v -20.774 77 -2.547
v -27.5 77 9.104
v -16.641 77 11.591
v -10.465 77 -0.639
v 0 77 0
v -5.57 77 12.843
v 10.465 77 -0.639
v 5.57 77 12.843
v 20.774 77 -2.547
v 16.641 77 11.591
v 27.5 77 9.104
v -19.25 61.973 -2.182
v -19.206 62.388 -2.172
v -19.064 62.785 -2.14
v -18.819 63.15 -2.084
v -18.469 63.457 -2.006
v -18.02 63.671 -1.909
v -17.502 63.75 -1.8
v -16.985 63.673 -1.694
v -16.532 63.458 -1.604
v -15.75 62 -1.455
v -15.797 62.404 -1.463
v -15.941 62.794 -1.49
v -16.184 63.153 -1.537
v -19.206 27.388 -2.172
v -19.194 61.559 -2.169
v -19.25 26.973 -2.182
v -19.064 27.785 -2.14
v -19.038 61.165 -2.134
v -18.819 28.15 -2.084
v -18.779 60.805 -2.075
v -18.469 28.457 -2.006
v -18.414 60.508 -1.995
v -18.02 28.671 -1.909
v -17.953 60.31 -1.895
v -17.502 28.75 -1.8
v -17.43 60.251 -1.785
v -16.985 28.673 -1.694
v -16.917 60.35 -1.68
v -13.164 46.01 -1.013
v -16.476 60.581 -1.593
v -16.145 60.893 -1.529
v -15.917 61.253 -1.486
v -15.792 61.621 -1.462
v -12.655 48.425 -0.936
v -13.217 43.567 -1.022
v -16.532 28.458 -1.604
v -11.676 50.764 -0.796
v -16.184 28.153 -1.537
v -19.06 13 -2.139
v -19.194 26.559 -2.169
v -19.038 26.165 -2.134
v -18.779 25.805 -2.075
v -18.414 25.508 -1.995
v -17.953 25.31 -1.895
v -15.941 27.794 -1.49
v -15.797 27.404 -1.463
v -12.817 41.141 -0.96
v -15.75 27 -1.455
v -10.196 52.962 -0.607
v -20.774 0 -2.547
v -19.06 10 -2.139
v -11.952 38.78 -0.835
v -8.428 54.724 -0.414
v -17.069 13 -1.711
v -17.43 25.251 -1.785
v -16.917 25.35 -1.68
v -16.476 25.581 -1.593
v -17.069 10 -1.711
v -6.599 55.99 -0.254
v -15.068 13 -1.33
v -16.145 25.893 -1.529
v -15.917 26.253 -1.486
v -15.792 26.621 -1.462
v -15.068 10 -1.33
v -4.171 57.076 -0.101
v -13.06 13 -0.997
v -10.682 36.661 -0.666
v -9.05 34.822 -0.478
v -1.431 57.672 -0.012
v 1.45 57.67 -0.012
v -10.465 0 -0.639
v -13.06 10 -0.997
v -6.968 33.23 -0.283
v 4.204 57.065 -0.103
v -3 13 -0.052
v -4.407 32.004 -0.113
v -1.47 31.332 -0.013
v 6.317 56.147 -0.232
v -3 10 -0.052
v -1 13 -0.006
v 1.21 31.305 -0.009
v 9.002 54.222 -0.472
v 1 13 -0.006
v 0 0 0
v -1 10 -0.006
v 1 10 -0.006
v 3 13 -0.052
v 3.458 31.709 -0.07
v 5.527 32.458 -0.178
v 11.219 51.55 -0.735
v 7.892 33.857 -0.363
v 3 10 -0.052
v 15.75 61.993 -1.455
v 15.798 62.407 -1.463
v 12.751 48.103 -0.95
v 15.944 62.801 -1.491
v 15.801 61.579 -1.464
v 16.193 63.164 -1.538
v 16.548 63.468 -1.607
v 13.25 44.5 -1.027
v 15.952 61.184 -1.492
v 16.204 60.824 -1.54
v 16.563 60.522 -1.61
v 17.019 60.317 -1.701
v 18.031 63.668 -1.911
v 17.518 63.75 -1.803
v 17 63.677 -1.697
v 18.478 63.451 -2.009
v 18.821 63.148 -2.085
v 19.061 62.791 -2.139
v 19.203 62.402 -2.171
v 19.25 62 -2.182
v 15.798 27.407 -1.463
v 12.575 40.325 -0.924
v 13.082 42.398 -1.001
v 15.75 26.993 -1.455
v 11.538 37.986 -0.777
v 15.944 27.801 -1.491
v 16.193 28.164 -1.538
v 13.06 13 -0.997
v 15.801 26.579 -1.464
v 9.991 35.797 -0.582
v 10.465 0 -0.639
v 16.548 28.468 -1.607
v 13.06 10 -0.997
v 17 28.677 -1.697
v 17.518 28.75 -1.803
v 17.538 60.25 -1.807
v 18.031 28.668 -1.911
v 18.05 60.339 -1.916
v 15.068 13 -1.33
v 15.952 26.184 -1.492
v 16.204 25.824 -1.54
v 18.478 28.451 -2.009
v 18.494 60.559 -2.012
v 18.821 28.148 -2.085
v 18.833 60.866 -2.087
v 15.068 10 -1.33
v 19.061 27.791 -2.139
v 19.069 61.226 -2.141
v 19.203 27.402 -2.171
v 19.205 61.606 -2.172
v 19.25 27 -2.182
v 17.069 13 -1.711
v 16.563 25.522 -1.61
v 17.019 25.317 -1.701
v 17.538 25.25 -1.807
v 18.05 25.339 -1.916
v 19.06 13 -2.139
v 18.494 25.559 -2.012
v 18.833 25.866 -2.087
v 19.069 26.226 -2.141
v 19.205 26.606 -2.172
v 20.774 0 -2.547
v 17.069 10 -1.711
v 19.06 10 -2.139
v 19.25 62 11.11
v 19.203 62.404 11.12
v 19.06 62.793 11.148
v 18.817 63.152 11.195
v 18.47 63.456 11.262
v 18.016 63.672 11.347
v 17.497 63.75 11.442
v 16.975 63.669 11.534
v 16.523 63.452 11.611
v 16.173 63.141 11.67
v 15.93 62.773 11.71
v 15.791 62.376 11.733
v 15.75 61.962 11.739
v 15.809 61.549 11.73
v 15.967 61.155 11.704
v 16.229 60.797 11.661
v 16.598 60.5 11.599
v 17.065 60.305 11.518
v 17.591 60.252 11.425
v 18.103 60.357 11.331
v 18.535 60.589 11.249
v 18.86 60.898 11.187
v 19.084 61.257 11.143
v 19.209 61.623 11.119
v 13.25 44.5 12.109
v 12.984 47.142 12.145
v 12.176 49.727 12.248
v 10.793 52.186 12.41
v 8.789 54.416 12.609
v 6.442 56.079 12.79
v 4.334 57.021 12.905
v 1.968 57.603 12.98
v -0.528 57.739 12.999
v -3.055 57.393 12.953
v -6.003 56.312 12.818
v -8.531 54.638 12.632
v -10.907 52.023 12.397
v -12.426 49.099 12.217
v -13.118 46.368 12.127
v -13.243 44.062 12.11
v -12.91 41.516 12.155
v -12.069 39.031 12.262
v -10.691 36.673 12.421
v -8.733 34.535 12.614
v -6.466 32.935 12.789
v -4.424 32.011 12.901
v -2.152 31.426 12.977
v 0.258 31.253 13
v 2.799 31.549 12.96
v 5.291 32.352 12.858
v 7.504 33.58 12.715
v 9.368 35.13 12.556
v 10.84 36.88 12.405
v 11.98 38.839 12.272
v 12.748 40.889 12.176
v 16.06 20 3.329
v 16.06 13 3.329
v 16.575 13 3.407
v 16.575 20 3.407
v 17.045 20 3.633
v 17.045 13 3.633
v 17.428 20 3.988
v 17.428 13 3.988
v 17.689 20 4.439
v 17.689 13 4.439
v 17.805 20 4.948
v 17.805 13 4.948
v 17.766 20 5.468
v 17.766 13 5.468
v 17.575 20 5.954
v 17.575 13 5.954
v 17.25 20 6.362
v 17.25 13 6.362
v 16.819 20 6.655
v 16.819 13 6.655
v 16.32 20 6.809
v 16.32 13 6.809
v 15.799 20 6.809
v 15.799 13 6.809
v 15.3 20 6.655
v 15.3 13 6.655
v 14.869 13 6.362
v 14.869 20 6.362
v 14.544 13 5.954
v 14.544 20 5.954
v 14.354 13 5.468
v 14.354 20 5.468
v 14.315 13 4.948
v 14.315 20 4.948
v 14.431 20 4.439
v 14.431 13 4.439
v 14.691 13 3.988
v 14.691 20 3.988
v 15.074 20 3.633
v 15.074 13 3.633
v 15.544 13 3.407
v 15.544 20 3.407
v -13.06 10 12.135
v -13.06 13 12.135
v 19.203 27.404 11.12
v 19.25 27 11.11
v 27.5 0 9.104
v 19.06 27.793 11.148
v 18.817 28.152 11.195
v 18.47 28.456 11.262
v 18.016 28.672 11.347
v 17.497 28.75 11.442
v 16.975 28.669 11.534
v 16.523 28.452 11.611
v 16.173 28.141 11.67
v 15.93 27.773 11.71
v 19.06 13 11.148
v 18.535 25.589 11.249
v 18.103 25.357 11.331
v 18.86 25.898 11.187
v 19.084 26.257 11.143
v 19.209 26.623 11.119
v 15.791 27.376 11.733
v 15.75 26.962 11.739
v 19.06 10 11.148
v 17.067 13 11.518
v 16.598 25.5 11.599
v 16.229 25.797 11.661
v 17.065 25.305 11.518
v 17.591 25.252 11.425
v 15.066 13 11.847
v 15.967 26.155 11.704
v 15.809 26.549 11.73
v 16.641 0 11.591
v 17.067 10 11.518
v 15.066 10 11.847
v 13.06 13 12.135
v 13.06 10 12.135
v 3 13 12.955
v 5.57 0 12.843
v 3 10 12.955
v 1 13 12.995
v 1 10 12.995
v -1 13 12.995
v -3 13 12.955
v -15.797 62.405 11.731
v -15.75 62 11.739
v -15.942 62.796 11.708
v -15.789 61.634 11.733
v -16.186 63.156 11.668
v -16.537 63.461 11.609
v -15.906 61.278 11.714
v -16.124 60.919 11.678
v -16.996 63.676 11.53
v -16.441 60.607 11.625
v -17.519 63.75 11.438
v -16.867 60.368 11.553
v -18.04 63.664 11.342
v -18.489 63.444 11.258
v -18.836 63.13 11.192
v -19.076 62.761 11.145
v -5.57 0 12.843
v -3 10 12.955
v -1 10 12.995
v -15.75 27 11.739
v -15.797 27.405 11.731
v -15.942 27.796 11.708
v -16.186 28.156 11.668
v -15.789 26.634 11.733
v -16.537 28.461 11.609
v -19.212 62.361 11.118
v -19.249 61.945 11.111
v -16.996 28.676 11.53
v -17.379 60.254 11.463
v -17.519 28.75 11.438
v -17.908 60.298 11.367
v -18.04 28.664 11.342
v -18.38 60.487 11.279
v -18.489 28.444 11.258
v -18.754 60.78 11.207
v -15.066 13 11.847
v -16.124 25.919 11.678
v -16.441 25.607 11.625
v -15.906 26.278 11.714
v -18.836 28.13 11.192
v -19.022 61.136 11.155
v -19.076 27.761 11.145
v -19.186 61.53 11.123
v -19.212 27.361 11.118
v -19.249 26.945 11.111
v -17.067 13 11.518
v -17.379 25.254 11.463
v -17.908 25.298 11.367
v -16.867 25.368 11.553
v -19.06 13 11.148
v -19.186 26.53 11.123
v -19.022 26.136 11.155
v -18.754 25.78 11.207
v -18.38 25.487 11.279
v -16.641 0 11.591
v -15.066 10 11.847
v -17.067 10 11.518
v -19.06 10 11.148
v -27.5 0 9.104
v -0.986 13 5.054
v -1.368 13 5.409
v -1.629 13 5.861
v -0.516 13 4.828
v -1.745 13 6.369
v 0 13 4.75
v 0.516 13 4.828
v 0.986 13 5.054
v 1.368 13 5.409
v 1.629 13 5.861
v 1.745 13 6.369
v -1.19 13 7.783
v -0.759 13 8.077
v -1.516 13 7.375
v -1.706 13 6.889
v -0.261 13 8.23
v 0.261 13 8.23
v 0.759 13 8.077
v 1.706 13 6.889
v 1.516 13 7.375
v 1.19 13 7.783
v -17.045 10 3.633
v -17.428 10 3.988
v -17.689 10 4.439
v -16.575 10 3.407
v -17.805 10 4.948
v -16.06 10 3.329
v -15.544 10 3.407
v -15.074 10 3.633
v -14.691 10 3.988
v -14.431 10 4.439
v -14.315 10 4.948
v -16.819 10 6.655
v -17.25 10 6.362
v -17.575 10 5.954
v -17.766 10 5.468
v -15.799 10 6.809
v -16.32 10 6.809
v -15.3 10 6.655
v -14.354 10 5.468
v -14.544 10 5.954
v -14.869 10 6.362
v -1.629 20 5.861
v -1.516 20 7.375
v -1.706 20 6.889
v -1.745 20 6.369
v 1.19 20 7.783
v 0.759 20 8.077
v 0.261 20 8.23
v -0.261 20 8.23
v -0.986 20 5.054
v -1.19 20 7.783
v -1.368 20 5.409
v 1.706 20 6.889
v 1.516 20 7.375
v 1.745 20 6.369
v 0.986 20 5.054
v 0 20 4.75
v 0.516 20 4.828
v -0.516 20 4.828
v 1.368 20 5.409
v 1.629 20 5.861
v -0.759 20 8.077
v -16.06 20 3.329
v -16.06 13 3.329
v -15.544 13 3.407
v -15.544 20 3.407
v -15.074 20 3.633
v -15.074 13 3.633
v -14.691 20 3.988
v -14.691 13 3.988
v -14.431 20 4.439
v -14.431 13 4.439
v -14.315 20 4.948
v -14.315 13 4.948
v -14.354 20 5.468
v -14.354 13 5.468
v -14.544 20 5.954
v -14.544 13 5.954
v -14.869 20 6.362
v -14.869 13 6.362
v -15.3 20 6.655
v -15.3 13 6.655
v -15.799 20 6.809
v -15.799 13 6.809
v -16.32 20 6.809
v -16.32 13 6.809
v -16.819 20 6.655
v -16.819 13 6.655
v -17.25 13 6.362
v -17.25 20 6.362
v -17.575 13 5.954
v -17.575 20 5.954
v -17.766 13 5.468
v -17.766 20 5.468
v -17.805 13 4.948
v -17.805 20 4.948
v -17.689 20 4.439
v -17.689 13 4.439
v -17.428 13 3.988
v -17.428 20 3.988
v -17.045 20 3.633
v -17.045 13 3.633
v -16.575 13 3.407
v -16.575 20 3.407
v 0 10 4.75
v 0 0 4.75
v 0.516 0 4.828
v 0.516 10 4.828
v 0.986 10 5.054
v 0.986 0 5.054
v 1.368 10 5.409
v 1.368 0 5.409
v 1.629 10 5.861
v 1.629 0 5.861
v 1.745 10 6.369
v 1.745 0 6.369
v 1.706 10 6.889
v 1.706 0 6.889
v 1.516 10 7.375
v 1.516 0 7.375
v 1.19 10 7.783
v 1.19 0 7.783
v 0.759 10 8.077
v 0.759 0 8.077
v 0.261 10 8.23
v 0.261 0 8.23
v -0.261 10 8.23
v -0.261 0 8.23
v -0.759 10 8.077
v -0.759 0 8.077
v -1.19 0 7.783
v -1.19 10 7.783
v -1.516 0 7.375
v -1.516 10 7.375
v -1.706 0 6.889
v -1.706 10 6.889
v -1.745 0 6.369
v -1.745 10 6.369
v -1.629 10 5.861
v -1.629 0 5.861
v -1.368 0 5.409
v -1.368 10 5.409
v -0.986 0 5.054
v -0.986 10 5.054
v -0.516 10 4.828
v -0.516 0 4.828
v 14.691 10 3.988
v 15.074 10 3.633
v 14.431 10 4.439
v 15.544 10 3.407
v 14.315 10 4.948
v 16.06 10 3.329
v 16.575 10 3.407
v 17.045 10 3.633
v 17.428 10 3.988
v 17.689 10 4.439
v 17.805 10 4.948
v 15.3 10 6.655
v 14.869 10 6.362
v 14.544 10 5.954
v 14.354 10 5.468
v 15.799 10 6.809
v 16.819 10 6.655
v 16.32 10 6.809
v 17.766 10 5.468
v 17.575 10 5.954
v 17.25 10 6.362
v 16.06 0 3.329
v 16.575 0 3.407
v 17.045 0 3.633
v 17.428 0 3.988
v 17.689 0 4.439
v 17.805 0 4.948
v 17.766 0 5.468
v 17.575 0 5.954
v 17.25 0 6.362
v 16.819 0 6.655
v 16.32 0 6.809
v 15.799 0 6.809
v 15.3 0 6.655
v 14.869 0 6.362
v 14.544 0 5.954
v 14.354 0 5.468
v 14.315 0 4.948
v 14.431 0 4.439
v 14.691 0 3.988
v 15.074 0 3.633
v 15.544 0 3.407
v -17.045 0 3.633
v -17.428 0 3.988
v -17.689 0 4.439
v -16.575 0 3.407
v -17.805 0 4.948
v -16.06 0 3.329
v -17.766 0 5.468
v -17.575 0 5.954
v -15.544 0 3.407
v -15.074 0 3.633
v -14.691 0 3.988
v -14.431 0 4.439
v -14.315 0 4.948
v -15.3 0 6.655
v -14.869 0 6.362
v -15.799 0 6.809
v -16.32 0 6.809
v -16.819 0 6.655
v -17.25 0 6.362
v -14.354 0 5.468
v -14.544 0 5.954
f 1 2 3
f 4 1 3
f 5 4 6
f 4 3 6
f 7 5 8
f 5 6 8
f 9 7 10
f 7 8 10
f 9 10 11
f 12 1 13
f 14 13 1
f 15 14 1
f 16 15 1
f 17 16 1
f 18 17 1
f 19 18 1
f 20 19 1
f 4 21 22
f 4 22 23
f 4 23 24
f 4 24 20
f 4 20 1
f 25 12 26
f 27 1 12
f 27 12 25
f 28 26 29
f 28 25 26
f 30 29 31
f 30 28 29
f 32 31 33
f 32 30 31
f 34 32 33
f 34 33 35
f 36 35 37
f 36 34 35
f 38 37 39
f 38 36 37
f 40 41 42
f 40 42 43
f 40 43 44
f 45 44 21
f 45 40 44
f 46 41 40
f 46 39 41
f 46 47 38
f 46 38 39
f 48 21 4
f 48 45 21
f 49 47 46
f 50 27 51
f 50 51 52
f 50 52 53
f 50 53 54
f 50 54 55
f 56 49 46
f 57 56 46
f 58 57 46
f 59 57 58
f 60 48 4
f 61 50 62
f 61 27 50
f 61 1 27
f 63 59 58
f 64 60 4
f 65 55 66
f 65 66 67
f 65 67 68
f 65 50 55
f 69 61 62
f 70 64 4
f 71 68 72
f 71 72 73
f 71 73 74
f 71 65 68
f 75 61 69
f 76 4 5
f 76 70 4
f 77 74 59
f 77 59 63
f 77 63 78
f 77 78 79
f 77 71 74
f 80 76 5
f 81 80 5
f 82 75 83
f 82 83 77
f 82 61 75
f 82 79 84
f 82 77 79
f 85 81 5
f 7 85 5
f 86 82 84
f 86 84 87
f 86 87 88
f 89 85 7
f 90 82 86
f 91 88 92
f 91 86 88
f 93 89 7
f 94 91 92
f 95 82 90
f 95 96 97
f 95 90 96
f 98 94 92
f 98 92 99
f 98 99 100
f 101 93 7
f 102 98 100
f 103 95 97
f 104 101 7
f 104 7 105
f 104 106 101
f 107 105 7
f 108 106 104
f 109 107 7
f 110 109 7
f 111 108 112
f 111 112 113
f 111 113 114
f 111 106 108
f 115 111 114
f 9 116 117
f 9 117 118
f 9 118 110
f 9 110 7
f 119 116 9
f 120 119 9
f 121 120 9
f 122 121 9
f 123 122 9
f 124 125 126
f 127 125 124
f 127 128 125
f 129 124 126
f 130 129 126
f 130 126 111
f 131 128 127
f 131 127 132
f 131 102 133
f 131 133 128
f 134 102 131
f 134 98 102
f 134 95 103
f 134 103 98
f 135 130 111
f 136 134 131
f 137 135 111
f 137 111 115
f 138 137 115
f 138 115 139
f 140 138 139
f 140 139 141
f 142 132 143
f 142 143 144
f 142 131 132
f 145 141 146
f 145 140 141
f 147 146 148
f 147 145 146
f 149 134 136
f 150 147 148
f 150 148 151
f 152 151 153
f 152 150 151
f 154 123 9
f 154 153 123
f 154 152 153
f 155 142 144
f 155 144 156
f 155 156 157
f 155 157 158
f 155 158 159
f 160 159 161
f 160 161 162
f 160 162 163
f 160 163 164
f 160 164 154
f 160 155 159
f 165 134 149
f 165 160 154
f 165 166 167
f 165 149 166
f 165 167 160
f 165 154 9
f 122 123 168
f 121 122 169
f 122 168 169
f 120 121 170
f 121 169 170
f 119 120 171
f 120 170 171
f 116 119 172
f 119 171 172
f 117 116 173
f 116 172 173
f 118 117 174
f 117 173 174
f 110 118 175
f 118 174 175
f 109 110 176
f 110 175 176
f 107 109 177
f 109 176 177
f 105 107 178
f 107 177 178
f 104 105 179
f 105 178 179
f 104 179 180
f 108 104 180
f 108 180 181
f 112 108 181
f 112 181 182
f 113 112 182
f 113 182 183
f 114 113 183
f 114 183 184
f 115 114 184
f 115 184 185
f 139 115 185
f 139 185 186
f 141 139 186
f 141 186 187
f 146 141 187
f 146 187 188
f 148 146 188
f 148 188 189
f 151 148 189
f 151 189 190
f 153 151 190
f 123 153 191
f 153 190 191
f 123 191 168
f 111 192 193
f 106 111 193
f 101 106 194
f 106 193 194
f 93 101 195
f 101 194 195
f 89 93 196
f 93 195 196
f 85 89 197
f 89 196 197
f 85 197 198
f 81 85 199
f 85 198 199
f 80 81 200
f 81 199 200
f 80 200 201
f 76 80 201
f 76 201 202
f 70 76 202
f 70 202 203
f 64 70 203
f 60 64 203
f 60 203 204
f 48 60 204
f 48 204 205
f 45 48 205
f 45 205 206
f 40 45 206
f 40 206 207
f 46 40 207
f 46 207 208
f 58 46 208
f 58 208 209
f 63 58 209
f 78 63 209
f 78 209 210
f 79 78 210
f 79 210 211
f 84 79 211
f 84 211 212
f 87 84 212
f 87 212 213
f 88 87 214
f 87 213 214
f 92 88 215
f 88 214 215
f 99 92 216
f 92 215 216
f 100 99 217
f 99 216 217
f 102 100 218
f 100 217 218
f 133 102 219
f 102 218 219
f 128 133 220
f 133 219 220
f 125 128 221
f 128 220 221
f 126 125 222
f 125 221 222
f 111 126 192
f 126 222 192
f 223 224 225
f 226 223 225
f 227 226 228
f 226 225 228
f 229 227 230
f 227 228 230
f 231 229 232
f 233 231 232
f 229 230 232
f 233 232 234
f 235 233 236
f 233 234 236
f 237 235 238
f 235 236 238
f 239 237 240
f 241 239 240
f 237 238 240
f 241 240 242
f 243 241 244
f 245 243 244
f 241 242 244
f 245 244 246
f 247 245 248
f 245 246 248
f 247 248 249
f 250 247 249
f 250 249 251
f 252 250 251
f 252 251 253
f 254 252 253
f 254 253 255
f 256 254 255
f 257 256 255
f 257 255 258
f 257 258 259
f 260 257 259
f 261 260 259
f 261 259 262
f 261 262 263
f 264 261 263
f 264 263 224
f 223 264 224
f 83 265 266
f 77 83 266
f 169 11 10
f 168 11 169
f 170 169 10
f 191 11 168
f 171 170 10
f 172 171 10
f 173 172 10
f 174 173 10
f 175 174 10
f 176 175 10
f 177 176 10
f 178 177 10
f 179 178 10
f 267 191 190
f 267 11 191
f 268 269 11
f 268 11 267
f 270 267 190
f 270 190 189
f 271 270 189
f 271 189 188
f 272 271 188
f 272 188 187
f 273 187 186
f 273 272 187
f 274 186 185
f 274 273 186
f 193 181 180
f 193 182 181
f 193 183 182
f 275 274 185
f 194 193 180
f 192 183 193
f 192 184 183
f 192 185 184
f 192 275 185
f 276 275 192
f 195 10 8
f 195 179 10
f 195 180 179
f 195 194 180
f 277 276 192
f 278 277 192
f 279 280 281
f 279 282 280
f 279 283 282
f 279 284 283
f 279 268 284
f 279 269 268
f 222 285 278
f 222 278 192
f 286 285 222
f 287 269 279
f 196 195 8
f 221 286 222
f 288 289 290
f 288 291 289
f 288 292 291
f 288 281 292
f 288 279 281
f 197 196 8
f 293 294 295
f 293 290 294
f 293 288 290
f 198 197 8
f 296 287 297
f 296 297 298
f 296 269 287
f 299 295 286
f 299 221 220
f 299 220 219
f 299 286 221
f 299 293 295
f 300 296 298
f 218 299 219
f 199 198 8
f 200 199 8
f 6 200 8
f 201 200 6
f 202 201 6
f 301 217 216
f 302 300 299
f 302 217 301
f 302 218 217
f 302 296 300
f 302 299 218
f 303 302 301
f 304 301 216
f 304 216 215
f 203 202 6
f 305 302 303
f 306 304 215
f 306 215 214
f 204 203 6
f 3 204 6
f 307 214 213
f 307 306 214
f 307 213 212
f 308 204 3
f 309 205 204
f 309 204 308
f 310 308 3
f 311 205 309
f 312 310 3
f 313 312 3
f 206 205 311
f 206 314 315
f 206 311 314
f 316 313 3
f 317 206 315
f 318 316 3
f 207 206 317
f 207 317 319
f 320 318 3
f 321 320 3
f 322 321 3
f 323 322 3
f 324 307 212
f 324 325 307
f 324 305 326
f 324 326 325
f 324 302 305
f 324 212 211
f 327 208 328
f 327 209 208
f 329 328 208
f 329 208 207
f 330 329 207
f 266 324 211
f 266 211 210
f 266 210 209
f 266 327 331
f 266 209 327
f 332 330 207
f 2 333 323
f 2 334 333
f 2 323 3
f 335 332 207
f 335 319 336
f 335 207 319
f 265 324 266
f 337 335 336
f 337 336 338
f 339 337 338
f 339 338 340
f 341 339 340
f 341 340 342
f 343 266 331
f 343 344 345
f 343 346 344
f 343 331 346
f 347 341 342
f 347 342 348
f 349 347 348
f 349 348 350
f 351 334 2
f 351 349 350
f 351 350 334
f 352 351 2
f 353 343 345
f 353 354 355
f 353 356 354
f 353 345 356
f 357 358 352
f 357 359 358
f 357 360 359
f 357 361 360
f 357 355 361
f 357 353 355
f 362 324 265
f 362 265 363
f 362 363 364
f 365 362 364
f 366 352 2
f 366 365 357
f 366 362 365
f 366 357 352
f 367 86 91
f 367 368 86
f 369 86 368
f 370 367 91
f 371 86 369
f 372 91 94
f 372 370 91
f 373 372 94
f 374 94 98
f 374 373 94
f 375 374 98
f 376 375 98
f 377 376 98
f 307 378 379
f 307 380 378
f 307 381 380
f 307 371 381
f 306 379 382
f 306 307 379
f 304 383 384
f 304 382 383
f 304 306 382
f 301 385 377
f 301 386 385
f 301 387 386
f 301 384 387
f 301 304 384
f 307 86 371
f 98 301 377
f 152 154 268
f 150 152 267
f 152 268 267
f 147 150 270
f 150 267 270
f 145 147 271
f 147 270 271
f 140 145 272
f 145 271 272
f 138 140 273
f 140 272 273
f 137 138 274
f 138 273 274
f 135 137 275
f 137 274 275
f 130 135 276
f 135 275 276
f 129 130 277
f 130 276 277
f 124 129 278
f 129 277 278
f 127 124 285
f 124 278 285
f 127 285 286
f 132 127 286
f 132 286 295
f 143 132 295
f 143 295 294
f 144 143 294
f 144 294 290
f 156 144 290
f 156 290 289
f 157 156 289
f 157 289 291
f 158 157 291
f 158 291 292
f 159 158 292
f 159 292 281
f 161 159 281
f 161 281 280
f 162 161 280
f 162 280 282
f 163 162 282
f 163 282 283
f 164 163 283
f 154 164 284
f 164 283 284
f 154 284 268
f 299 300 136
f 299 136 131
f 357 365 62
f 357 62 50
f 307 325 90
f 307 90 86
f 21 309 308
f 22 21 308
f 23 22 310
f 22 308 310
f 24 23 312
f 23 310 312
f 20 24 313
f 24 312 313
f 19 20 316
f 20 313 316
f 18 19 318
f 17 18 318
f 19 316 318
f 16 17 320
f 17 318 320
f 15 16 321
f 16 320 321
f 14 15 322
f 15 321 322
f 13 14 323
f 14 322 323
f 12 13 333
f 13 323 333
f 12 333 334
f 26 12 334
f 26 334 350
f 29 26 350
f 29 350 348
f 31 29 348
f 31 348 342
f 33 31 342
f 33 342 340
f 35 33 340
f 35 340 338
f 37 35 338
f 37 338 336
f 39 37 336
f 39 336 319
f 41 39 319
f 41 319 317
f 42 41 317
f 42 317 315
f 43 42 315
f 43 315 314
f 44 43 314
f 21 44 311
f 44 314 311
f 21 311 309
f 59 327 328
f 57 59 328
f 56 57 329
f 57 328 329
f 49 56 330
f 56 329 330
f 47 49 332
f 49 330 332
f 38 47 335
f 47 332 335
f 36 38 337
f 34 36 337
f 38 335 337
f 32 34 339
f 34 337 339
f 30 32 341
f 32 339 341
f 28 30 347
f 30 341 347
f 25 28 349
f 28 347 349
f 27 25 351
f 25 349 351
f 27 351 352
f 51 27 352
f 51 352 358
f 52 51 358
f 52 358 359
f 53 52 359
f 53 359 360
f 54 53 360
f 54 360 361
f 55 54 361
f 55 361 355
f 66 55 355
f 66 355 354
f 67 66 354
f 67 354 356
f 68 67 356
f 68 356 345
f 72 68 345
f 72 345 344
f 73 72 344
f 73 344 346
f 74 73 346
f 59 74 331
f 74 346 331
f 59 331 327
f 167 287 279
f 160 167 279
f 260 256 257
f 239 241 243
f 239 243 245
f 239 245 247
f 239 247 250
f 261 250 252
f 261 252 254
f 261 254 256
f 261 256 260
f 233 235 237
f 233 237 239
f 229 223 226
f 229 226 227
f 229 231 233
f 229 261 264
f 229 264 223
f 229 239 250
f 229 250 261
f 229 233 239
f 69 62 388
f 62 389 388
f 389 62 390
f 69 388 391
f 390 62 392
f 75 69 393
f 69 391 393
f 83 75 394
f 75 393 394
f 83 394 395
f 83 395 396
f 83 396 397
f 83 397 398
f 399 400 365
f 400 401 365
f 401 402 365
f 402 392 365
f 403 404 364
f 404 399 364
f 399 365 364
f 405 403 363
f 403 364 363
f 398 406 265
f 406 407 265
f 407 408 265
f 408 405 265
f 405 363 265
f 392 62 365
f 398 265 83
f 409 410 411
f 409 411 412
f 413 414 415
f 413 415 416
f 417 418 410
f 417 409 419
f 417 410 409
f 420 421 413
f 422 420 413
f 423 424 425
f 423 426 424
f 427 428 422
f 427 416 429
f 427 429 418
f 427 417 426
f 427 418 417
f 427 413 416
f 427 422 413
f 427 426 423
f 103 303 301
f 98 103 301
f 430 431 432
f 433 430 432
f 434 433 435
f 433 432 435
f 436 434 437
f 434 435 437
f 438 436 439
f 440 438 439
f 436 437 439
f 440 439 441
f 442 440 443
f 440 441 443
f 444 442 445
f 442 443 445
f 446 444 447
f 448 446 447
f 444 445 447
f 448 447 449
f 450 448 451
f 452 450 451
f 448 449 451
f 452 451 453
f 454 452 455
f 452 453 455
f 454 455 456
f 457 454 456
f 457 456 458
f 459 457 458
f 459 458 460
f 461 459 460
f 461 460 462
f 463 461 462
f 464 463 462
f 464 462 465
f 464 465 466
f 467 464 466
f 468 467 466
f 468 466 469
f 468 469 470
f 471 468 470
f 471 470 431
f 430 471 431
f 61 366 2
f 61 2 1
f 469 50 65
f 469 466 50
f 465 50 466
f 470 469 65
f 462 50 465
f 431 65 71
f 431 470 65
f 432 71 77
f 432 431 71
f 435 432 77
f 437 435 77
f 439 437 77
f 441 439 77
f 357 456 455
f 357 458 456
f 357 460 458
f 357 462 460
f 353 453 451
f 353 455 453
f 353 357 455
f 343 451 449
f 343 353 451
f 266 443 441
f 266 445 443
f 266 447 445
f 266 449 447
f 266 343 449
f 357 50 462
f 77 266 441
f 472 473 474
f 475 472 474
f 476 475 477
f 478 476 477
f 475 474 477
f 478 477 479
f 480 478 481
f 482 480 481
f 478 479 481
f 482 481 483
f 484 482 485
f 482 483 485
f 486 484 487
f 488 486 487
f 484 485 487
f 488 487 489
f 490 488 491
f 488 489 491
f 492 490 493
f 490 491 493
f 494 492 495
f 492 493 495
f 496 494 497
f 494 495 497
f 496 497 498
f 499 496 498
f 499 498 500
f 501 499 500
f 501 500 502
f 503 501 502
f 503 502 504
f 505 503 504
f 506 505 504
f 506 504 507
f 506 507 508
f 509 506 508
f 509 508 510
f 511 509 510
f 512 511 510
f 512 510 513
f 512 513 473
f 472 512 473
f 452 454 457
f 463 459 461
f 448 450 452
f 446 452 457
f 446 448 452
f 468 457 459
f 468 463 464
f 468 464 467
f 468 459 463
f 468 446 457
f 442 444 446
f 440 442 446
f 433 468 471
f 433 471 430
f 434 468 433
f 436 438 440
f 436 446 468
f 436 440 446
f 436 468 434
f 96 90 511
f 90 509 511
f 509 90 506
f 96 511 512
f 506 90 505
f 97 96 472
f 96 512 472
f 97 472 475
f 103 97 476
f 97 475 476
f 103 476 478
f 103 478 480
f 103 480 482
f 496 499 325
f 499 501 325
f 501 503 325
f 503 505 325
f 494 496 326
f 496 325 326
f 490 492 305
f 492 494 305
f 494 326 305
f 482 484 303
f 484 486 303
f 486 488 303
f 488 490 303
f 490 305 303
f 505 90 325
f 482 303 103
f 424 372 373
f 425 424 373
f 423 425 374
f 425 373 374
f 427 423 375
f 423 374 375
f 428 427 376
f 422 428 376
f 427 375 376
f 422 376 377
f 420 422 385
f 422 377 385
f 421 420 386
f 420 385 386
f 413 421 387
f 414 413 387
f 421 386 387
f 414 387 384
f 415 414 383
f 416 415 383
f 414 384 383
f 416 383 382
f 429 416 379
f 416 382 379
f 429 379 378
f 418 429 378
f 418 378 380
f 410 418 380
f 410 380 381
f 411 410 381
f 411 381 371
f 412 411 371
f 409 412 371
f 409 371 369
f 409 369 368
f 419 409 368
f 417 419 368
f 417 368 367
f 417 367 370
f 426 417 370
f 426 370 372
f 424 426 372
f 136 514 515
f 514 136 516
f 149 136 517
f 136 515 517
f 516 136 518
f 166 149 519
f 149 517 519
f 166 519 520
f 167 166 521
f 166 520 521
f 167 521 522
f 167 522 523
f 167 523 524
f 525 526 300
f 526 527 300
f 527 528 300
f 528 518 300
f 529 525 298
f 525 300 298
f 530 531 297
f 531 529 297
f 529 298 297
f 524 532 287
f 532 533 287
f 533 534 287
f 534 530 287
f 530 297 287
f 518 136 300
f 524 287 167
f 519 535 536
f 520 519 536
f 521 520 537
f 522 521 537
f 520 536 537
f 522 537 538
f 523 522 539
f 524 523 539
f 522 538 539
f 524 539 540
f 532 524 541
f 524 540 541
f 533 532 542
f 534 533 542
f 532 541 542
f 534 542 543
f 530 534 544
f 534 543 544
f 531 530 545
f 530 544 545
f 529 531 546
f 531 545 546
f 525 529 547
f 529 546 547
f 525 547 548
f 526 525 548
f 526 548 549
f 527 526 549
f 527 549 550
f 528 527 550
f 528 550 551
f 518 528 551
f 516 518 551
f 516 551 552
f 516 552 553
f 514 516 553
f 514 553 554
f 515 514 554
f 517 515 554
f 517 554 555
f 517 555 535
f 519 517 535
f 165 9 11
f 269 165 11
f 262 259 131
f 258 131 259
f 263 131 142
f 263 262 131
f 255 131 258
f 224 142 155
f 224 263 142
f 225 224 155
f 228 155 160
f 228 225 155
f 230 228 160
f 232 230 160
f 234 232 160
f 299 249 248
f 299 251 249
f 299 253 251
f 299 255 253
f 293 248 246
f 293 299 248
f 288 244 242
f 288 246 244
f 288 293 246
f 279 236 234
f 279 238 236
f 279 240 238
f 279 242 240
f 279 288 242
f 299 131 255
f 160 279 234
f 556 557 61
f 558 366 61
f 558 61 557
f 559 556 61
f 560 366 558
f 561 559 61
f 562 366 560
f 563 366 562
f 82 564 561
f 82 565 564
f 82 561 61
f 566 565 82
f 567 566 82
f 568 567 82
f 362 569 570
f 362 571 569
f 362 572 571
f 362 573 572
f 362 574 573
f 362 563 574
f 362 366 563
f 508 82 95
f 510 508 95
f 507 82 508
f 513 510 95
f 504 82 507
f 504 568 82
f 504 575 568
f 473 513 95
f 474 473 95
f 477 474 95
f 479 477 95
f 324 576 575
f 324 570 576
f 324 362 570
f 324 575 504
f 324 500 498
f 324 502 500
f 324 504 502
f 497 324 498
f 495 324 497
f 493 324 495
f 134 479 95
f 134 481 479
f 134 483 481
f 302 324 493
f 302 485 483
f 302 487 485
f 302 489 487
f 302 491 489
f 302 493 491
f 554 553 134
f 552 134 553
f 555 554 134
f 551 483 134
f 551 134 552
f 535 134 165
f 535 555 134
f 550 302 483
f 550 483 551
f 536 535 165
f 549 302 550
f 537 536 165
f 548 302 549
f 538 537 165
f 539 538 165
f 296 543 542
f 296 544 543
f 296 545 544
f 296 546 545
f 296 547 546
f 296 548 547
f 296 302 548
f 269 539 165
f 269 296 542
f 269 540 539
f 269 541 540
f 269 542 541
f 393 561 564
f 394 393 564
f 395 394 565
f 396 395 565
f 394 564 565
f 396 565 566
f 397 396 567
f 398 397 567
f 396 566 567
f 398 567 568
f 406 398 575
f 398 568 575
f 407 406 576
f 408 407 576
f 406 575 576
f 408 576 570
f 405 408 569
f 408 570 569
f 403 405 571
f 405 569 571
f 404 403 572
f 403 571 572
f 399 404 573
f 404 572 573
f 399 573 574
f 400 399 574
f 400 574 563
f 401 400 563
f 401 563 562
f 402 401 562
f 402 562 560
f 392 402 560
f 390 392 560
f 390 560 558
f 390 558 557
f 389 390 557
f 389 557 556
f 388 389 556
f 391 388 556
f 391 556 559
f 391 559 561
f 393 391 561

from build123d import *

# Parameters (mm, degrees)
EXTRUDE_1_DEPTH     = 77
SKETCH_2_R          = 1.75
CUT_EXTRUDE_1_DEPTH = 20
SKETCH_3_W          = 6
SKETCH_3_H          = 3
CUT_EXTRUDE_2_DEPTH = 84.228292678
SKETCH_4_R          = 13.25
CUT_EXTRUDE_3_DEPTH = 84.228292678
SKETCH_7_R          = 1.75
CUT_EXTRUDE_4_DEPTH = 84.228292822


with BuildPart() as part:
    # Эскиз1 → Бобышка-Вытянуть1 (new body)
    with BuildSketch(Plane(origin=(0, 0, 0), x_dir=(-1, 0, 0), z_dir=(0, 1, 0))):
        with BuildLine():
            Line((27.5, 9.103890562), (20.77355029, -2.54666209))
            ThreePointArc((20.77355029, -2.54666209), (0, 0), (-20.77355029, -2.54666209))
            Line((-20.77355029, -2.54666209), (-27.5, 9.103890562))
            ThreePointArc((-27.5, 9.103890562), (0, 13), (27.5, 9.103890562))
        make_face()
    extrude(amount=EXTRUDE_1_DEPTH)

    # Эскиз2 → Вырез-Вытянуть1 (cut)
    with BuildSketch(Plane.XZ):
        with Locations(Location((0, 6.5, 0), (0, 0, 270))):
            Circle(SKETCH_2_R)
        with Locations(Location((16.059644847, 5.07877185, 0), (0, 0, 270))):
            Circle(SKETCH_2_R)
        with Locations(Location((-16.059644847, 5.07877185, 0), (0, 0, 270))):
            Circle(SKETCH_2_R)
    extrude(amount=-CUT_EXTRUDE_1_DEPTH, mode=Mode.SUBTRACT)

    # Эскиз3 → Вырез-Вытянуть2 (cut, through all)
    with BuildSketch(Plane.XY.offset(13)):
        with Locations((-16.059644847, 11.5)):
            Rectangle(SKETCH_3_W, SKETCH_3_H)
        with Locations((0, 11.5)):
            Rectangle(SKETCH_3_W, SKETCH_3_H)
        with Locations((16.059644847, 11.5)):
            Rectangle(SKETCH_3_W, SKETCH_3_H)
    extrude(amount=-CUT_EXTRUDE_2_DEPTH, mode=Mode.SUBTRACT)

    # Эскиз4 → Вырез-Вытянуть3 (cut, through all)
    with BuildSketch(Plane.XY.offset(13)):
        with Locations((0, 44.5)):
            Circle(SKETCH_4_R)
    extrude(amount=-CUT_EXTRUDE_3_DEPTH, mode=Mode.SUBTRACT)

    # Эскиз7 → Вырез-Вытянуть4 (cut, through all)
    with BuildSketch(Plane.XY.offset(13)):
        with Locations((-17.5, 62)):
            Circle(SKETCH_7_R)
        with Locations((17.5, 62)):
            Circle(SKETCH_7_R)
        with Locations((17.5, 27)):
            Circle(SKETCH_7_R)
        with Locations((-17.5, 27)):
            Circle(SKETCH_7_R)
    extrude(amount=-CUT_EXTRUDE_4_DEPTH, mode=Mode.SUBTRACT)


solid = part.part
